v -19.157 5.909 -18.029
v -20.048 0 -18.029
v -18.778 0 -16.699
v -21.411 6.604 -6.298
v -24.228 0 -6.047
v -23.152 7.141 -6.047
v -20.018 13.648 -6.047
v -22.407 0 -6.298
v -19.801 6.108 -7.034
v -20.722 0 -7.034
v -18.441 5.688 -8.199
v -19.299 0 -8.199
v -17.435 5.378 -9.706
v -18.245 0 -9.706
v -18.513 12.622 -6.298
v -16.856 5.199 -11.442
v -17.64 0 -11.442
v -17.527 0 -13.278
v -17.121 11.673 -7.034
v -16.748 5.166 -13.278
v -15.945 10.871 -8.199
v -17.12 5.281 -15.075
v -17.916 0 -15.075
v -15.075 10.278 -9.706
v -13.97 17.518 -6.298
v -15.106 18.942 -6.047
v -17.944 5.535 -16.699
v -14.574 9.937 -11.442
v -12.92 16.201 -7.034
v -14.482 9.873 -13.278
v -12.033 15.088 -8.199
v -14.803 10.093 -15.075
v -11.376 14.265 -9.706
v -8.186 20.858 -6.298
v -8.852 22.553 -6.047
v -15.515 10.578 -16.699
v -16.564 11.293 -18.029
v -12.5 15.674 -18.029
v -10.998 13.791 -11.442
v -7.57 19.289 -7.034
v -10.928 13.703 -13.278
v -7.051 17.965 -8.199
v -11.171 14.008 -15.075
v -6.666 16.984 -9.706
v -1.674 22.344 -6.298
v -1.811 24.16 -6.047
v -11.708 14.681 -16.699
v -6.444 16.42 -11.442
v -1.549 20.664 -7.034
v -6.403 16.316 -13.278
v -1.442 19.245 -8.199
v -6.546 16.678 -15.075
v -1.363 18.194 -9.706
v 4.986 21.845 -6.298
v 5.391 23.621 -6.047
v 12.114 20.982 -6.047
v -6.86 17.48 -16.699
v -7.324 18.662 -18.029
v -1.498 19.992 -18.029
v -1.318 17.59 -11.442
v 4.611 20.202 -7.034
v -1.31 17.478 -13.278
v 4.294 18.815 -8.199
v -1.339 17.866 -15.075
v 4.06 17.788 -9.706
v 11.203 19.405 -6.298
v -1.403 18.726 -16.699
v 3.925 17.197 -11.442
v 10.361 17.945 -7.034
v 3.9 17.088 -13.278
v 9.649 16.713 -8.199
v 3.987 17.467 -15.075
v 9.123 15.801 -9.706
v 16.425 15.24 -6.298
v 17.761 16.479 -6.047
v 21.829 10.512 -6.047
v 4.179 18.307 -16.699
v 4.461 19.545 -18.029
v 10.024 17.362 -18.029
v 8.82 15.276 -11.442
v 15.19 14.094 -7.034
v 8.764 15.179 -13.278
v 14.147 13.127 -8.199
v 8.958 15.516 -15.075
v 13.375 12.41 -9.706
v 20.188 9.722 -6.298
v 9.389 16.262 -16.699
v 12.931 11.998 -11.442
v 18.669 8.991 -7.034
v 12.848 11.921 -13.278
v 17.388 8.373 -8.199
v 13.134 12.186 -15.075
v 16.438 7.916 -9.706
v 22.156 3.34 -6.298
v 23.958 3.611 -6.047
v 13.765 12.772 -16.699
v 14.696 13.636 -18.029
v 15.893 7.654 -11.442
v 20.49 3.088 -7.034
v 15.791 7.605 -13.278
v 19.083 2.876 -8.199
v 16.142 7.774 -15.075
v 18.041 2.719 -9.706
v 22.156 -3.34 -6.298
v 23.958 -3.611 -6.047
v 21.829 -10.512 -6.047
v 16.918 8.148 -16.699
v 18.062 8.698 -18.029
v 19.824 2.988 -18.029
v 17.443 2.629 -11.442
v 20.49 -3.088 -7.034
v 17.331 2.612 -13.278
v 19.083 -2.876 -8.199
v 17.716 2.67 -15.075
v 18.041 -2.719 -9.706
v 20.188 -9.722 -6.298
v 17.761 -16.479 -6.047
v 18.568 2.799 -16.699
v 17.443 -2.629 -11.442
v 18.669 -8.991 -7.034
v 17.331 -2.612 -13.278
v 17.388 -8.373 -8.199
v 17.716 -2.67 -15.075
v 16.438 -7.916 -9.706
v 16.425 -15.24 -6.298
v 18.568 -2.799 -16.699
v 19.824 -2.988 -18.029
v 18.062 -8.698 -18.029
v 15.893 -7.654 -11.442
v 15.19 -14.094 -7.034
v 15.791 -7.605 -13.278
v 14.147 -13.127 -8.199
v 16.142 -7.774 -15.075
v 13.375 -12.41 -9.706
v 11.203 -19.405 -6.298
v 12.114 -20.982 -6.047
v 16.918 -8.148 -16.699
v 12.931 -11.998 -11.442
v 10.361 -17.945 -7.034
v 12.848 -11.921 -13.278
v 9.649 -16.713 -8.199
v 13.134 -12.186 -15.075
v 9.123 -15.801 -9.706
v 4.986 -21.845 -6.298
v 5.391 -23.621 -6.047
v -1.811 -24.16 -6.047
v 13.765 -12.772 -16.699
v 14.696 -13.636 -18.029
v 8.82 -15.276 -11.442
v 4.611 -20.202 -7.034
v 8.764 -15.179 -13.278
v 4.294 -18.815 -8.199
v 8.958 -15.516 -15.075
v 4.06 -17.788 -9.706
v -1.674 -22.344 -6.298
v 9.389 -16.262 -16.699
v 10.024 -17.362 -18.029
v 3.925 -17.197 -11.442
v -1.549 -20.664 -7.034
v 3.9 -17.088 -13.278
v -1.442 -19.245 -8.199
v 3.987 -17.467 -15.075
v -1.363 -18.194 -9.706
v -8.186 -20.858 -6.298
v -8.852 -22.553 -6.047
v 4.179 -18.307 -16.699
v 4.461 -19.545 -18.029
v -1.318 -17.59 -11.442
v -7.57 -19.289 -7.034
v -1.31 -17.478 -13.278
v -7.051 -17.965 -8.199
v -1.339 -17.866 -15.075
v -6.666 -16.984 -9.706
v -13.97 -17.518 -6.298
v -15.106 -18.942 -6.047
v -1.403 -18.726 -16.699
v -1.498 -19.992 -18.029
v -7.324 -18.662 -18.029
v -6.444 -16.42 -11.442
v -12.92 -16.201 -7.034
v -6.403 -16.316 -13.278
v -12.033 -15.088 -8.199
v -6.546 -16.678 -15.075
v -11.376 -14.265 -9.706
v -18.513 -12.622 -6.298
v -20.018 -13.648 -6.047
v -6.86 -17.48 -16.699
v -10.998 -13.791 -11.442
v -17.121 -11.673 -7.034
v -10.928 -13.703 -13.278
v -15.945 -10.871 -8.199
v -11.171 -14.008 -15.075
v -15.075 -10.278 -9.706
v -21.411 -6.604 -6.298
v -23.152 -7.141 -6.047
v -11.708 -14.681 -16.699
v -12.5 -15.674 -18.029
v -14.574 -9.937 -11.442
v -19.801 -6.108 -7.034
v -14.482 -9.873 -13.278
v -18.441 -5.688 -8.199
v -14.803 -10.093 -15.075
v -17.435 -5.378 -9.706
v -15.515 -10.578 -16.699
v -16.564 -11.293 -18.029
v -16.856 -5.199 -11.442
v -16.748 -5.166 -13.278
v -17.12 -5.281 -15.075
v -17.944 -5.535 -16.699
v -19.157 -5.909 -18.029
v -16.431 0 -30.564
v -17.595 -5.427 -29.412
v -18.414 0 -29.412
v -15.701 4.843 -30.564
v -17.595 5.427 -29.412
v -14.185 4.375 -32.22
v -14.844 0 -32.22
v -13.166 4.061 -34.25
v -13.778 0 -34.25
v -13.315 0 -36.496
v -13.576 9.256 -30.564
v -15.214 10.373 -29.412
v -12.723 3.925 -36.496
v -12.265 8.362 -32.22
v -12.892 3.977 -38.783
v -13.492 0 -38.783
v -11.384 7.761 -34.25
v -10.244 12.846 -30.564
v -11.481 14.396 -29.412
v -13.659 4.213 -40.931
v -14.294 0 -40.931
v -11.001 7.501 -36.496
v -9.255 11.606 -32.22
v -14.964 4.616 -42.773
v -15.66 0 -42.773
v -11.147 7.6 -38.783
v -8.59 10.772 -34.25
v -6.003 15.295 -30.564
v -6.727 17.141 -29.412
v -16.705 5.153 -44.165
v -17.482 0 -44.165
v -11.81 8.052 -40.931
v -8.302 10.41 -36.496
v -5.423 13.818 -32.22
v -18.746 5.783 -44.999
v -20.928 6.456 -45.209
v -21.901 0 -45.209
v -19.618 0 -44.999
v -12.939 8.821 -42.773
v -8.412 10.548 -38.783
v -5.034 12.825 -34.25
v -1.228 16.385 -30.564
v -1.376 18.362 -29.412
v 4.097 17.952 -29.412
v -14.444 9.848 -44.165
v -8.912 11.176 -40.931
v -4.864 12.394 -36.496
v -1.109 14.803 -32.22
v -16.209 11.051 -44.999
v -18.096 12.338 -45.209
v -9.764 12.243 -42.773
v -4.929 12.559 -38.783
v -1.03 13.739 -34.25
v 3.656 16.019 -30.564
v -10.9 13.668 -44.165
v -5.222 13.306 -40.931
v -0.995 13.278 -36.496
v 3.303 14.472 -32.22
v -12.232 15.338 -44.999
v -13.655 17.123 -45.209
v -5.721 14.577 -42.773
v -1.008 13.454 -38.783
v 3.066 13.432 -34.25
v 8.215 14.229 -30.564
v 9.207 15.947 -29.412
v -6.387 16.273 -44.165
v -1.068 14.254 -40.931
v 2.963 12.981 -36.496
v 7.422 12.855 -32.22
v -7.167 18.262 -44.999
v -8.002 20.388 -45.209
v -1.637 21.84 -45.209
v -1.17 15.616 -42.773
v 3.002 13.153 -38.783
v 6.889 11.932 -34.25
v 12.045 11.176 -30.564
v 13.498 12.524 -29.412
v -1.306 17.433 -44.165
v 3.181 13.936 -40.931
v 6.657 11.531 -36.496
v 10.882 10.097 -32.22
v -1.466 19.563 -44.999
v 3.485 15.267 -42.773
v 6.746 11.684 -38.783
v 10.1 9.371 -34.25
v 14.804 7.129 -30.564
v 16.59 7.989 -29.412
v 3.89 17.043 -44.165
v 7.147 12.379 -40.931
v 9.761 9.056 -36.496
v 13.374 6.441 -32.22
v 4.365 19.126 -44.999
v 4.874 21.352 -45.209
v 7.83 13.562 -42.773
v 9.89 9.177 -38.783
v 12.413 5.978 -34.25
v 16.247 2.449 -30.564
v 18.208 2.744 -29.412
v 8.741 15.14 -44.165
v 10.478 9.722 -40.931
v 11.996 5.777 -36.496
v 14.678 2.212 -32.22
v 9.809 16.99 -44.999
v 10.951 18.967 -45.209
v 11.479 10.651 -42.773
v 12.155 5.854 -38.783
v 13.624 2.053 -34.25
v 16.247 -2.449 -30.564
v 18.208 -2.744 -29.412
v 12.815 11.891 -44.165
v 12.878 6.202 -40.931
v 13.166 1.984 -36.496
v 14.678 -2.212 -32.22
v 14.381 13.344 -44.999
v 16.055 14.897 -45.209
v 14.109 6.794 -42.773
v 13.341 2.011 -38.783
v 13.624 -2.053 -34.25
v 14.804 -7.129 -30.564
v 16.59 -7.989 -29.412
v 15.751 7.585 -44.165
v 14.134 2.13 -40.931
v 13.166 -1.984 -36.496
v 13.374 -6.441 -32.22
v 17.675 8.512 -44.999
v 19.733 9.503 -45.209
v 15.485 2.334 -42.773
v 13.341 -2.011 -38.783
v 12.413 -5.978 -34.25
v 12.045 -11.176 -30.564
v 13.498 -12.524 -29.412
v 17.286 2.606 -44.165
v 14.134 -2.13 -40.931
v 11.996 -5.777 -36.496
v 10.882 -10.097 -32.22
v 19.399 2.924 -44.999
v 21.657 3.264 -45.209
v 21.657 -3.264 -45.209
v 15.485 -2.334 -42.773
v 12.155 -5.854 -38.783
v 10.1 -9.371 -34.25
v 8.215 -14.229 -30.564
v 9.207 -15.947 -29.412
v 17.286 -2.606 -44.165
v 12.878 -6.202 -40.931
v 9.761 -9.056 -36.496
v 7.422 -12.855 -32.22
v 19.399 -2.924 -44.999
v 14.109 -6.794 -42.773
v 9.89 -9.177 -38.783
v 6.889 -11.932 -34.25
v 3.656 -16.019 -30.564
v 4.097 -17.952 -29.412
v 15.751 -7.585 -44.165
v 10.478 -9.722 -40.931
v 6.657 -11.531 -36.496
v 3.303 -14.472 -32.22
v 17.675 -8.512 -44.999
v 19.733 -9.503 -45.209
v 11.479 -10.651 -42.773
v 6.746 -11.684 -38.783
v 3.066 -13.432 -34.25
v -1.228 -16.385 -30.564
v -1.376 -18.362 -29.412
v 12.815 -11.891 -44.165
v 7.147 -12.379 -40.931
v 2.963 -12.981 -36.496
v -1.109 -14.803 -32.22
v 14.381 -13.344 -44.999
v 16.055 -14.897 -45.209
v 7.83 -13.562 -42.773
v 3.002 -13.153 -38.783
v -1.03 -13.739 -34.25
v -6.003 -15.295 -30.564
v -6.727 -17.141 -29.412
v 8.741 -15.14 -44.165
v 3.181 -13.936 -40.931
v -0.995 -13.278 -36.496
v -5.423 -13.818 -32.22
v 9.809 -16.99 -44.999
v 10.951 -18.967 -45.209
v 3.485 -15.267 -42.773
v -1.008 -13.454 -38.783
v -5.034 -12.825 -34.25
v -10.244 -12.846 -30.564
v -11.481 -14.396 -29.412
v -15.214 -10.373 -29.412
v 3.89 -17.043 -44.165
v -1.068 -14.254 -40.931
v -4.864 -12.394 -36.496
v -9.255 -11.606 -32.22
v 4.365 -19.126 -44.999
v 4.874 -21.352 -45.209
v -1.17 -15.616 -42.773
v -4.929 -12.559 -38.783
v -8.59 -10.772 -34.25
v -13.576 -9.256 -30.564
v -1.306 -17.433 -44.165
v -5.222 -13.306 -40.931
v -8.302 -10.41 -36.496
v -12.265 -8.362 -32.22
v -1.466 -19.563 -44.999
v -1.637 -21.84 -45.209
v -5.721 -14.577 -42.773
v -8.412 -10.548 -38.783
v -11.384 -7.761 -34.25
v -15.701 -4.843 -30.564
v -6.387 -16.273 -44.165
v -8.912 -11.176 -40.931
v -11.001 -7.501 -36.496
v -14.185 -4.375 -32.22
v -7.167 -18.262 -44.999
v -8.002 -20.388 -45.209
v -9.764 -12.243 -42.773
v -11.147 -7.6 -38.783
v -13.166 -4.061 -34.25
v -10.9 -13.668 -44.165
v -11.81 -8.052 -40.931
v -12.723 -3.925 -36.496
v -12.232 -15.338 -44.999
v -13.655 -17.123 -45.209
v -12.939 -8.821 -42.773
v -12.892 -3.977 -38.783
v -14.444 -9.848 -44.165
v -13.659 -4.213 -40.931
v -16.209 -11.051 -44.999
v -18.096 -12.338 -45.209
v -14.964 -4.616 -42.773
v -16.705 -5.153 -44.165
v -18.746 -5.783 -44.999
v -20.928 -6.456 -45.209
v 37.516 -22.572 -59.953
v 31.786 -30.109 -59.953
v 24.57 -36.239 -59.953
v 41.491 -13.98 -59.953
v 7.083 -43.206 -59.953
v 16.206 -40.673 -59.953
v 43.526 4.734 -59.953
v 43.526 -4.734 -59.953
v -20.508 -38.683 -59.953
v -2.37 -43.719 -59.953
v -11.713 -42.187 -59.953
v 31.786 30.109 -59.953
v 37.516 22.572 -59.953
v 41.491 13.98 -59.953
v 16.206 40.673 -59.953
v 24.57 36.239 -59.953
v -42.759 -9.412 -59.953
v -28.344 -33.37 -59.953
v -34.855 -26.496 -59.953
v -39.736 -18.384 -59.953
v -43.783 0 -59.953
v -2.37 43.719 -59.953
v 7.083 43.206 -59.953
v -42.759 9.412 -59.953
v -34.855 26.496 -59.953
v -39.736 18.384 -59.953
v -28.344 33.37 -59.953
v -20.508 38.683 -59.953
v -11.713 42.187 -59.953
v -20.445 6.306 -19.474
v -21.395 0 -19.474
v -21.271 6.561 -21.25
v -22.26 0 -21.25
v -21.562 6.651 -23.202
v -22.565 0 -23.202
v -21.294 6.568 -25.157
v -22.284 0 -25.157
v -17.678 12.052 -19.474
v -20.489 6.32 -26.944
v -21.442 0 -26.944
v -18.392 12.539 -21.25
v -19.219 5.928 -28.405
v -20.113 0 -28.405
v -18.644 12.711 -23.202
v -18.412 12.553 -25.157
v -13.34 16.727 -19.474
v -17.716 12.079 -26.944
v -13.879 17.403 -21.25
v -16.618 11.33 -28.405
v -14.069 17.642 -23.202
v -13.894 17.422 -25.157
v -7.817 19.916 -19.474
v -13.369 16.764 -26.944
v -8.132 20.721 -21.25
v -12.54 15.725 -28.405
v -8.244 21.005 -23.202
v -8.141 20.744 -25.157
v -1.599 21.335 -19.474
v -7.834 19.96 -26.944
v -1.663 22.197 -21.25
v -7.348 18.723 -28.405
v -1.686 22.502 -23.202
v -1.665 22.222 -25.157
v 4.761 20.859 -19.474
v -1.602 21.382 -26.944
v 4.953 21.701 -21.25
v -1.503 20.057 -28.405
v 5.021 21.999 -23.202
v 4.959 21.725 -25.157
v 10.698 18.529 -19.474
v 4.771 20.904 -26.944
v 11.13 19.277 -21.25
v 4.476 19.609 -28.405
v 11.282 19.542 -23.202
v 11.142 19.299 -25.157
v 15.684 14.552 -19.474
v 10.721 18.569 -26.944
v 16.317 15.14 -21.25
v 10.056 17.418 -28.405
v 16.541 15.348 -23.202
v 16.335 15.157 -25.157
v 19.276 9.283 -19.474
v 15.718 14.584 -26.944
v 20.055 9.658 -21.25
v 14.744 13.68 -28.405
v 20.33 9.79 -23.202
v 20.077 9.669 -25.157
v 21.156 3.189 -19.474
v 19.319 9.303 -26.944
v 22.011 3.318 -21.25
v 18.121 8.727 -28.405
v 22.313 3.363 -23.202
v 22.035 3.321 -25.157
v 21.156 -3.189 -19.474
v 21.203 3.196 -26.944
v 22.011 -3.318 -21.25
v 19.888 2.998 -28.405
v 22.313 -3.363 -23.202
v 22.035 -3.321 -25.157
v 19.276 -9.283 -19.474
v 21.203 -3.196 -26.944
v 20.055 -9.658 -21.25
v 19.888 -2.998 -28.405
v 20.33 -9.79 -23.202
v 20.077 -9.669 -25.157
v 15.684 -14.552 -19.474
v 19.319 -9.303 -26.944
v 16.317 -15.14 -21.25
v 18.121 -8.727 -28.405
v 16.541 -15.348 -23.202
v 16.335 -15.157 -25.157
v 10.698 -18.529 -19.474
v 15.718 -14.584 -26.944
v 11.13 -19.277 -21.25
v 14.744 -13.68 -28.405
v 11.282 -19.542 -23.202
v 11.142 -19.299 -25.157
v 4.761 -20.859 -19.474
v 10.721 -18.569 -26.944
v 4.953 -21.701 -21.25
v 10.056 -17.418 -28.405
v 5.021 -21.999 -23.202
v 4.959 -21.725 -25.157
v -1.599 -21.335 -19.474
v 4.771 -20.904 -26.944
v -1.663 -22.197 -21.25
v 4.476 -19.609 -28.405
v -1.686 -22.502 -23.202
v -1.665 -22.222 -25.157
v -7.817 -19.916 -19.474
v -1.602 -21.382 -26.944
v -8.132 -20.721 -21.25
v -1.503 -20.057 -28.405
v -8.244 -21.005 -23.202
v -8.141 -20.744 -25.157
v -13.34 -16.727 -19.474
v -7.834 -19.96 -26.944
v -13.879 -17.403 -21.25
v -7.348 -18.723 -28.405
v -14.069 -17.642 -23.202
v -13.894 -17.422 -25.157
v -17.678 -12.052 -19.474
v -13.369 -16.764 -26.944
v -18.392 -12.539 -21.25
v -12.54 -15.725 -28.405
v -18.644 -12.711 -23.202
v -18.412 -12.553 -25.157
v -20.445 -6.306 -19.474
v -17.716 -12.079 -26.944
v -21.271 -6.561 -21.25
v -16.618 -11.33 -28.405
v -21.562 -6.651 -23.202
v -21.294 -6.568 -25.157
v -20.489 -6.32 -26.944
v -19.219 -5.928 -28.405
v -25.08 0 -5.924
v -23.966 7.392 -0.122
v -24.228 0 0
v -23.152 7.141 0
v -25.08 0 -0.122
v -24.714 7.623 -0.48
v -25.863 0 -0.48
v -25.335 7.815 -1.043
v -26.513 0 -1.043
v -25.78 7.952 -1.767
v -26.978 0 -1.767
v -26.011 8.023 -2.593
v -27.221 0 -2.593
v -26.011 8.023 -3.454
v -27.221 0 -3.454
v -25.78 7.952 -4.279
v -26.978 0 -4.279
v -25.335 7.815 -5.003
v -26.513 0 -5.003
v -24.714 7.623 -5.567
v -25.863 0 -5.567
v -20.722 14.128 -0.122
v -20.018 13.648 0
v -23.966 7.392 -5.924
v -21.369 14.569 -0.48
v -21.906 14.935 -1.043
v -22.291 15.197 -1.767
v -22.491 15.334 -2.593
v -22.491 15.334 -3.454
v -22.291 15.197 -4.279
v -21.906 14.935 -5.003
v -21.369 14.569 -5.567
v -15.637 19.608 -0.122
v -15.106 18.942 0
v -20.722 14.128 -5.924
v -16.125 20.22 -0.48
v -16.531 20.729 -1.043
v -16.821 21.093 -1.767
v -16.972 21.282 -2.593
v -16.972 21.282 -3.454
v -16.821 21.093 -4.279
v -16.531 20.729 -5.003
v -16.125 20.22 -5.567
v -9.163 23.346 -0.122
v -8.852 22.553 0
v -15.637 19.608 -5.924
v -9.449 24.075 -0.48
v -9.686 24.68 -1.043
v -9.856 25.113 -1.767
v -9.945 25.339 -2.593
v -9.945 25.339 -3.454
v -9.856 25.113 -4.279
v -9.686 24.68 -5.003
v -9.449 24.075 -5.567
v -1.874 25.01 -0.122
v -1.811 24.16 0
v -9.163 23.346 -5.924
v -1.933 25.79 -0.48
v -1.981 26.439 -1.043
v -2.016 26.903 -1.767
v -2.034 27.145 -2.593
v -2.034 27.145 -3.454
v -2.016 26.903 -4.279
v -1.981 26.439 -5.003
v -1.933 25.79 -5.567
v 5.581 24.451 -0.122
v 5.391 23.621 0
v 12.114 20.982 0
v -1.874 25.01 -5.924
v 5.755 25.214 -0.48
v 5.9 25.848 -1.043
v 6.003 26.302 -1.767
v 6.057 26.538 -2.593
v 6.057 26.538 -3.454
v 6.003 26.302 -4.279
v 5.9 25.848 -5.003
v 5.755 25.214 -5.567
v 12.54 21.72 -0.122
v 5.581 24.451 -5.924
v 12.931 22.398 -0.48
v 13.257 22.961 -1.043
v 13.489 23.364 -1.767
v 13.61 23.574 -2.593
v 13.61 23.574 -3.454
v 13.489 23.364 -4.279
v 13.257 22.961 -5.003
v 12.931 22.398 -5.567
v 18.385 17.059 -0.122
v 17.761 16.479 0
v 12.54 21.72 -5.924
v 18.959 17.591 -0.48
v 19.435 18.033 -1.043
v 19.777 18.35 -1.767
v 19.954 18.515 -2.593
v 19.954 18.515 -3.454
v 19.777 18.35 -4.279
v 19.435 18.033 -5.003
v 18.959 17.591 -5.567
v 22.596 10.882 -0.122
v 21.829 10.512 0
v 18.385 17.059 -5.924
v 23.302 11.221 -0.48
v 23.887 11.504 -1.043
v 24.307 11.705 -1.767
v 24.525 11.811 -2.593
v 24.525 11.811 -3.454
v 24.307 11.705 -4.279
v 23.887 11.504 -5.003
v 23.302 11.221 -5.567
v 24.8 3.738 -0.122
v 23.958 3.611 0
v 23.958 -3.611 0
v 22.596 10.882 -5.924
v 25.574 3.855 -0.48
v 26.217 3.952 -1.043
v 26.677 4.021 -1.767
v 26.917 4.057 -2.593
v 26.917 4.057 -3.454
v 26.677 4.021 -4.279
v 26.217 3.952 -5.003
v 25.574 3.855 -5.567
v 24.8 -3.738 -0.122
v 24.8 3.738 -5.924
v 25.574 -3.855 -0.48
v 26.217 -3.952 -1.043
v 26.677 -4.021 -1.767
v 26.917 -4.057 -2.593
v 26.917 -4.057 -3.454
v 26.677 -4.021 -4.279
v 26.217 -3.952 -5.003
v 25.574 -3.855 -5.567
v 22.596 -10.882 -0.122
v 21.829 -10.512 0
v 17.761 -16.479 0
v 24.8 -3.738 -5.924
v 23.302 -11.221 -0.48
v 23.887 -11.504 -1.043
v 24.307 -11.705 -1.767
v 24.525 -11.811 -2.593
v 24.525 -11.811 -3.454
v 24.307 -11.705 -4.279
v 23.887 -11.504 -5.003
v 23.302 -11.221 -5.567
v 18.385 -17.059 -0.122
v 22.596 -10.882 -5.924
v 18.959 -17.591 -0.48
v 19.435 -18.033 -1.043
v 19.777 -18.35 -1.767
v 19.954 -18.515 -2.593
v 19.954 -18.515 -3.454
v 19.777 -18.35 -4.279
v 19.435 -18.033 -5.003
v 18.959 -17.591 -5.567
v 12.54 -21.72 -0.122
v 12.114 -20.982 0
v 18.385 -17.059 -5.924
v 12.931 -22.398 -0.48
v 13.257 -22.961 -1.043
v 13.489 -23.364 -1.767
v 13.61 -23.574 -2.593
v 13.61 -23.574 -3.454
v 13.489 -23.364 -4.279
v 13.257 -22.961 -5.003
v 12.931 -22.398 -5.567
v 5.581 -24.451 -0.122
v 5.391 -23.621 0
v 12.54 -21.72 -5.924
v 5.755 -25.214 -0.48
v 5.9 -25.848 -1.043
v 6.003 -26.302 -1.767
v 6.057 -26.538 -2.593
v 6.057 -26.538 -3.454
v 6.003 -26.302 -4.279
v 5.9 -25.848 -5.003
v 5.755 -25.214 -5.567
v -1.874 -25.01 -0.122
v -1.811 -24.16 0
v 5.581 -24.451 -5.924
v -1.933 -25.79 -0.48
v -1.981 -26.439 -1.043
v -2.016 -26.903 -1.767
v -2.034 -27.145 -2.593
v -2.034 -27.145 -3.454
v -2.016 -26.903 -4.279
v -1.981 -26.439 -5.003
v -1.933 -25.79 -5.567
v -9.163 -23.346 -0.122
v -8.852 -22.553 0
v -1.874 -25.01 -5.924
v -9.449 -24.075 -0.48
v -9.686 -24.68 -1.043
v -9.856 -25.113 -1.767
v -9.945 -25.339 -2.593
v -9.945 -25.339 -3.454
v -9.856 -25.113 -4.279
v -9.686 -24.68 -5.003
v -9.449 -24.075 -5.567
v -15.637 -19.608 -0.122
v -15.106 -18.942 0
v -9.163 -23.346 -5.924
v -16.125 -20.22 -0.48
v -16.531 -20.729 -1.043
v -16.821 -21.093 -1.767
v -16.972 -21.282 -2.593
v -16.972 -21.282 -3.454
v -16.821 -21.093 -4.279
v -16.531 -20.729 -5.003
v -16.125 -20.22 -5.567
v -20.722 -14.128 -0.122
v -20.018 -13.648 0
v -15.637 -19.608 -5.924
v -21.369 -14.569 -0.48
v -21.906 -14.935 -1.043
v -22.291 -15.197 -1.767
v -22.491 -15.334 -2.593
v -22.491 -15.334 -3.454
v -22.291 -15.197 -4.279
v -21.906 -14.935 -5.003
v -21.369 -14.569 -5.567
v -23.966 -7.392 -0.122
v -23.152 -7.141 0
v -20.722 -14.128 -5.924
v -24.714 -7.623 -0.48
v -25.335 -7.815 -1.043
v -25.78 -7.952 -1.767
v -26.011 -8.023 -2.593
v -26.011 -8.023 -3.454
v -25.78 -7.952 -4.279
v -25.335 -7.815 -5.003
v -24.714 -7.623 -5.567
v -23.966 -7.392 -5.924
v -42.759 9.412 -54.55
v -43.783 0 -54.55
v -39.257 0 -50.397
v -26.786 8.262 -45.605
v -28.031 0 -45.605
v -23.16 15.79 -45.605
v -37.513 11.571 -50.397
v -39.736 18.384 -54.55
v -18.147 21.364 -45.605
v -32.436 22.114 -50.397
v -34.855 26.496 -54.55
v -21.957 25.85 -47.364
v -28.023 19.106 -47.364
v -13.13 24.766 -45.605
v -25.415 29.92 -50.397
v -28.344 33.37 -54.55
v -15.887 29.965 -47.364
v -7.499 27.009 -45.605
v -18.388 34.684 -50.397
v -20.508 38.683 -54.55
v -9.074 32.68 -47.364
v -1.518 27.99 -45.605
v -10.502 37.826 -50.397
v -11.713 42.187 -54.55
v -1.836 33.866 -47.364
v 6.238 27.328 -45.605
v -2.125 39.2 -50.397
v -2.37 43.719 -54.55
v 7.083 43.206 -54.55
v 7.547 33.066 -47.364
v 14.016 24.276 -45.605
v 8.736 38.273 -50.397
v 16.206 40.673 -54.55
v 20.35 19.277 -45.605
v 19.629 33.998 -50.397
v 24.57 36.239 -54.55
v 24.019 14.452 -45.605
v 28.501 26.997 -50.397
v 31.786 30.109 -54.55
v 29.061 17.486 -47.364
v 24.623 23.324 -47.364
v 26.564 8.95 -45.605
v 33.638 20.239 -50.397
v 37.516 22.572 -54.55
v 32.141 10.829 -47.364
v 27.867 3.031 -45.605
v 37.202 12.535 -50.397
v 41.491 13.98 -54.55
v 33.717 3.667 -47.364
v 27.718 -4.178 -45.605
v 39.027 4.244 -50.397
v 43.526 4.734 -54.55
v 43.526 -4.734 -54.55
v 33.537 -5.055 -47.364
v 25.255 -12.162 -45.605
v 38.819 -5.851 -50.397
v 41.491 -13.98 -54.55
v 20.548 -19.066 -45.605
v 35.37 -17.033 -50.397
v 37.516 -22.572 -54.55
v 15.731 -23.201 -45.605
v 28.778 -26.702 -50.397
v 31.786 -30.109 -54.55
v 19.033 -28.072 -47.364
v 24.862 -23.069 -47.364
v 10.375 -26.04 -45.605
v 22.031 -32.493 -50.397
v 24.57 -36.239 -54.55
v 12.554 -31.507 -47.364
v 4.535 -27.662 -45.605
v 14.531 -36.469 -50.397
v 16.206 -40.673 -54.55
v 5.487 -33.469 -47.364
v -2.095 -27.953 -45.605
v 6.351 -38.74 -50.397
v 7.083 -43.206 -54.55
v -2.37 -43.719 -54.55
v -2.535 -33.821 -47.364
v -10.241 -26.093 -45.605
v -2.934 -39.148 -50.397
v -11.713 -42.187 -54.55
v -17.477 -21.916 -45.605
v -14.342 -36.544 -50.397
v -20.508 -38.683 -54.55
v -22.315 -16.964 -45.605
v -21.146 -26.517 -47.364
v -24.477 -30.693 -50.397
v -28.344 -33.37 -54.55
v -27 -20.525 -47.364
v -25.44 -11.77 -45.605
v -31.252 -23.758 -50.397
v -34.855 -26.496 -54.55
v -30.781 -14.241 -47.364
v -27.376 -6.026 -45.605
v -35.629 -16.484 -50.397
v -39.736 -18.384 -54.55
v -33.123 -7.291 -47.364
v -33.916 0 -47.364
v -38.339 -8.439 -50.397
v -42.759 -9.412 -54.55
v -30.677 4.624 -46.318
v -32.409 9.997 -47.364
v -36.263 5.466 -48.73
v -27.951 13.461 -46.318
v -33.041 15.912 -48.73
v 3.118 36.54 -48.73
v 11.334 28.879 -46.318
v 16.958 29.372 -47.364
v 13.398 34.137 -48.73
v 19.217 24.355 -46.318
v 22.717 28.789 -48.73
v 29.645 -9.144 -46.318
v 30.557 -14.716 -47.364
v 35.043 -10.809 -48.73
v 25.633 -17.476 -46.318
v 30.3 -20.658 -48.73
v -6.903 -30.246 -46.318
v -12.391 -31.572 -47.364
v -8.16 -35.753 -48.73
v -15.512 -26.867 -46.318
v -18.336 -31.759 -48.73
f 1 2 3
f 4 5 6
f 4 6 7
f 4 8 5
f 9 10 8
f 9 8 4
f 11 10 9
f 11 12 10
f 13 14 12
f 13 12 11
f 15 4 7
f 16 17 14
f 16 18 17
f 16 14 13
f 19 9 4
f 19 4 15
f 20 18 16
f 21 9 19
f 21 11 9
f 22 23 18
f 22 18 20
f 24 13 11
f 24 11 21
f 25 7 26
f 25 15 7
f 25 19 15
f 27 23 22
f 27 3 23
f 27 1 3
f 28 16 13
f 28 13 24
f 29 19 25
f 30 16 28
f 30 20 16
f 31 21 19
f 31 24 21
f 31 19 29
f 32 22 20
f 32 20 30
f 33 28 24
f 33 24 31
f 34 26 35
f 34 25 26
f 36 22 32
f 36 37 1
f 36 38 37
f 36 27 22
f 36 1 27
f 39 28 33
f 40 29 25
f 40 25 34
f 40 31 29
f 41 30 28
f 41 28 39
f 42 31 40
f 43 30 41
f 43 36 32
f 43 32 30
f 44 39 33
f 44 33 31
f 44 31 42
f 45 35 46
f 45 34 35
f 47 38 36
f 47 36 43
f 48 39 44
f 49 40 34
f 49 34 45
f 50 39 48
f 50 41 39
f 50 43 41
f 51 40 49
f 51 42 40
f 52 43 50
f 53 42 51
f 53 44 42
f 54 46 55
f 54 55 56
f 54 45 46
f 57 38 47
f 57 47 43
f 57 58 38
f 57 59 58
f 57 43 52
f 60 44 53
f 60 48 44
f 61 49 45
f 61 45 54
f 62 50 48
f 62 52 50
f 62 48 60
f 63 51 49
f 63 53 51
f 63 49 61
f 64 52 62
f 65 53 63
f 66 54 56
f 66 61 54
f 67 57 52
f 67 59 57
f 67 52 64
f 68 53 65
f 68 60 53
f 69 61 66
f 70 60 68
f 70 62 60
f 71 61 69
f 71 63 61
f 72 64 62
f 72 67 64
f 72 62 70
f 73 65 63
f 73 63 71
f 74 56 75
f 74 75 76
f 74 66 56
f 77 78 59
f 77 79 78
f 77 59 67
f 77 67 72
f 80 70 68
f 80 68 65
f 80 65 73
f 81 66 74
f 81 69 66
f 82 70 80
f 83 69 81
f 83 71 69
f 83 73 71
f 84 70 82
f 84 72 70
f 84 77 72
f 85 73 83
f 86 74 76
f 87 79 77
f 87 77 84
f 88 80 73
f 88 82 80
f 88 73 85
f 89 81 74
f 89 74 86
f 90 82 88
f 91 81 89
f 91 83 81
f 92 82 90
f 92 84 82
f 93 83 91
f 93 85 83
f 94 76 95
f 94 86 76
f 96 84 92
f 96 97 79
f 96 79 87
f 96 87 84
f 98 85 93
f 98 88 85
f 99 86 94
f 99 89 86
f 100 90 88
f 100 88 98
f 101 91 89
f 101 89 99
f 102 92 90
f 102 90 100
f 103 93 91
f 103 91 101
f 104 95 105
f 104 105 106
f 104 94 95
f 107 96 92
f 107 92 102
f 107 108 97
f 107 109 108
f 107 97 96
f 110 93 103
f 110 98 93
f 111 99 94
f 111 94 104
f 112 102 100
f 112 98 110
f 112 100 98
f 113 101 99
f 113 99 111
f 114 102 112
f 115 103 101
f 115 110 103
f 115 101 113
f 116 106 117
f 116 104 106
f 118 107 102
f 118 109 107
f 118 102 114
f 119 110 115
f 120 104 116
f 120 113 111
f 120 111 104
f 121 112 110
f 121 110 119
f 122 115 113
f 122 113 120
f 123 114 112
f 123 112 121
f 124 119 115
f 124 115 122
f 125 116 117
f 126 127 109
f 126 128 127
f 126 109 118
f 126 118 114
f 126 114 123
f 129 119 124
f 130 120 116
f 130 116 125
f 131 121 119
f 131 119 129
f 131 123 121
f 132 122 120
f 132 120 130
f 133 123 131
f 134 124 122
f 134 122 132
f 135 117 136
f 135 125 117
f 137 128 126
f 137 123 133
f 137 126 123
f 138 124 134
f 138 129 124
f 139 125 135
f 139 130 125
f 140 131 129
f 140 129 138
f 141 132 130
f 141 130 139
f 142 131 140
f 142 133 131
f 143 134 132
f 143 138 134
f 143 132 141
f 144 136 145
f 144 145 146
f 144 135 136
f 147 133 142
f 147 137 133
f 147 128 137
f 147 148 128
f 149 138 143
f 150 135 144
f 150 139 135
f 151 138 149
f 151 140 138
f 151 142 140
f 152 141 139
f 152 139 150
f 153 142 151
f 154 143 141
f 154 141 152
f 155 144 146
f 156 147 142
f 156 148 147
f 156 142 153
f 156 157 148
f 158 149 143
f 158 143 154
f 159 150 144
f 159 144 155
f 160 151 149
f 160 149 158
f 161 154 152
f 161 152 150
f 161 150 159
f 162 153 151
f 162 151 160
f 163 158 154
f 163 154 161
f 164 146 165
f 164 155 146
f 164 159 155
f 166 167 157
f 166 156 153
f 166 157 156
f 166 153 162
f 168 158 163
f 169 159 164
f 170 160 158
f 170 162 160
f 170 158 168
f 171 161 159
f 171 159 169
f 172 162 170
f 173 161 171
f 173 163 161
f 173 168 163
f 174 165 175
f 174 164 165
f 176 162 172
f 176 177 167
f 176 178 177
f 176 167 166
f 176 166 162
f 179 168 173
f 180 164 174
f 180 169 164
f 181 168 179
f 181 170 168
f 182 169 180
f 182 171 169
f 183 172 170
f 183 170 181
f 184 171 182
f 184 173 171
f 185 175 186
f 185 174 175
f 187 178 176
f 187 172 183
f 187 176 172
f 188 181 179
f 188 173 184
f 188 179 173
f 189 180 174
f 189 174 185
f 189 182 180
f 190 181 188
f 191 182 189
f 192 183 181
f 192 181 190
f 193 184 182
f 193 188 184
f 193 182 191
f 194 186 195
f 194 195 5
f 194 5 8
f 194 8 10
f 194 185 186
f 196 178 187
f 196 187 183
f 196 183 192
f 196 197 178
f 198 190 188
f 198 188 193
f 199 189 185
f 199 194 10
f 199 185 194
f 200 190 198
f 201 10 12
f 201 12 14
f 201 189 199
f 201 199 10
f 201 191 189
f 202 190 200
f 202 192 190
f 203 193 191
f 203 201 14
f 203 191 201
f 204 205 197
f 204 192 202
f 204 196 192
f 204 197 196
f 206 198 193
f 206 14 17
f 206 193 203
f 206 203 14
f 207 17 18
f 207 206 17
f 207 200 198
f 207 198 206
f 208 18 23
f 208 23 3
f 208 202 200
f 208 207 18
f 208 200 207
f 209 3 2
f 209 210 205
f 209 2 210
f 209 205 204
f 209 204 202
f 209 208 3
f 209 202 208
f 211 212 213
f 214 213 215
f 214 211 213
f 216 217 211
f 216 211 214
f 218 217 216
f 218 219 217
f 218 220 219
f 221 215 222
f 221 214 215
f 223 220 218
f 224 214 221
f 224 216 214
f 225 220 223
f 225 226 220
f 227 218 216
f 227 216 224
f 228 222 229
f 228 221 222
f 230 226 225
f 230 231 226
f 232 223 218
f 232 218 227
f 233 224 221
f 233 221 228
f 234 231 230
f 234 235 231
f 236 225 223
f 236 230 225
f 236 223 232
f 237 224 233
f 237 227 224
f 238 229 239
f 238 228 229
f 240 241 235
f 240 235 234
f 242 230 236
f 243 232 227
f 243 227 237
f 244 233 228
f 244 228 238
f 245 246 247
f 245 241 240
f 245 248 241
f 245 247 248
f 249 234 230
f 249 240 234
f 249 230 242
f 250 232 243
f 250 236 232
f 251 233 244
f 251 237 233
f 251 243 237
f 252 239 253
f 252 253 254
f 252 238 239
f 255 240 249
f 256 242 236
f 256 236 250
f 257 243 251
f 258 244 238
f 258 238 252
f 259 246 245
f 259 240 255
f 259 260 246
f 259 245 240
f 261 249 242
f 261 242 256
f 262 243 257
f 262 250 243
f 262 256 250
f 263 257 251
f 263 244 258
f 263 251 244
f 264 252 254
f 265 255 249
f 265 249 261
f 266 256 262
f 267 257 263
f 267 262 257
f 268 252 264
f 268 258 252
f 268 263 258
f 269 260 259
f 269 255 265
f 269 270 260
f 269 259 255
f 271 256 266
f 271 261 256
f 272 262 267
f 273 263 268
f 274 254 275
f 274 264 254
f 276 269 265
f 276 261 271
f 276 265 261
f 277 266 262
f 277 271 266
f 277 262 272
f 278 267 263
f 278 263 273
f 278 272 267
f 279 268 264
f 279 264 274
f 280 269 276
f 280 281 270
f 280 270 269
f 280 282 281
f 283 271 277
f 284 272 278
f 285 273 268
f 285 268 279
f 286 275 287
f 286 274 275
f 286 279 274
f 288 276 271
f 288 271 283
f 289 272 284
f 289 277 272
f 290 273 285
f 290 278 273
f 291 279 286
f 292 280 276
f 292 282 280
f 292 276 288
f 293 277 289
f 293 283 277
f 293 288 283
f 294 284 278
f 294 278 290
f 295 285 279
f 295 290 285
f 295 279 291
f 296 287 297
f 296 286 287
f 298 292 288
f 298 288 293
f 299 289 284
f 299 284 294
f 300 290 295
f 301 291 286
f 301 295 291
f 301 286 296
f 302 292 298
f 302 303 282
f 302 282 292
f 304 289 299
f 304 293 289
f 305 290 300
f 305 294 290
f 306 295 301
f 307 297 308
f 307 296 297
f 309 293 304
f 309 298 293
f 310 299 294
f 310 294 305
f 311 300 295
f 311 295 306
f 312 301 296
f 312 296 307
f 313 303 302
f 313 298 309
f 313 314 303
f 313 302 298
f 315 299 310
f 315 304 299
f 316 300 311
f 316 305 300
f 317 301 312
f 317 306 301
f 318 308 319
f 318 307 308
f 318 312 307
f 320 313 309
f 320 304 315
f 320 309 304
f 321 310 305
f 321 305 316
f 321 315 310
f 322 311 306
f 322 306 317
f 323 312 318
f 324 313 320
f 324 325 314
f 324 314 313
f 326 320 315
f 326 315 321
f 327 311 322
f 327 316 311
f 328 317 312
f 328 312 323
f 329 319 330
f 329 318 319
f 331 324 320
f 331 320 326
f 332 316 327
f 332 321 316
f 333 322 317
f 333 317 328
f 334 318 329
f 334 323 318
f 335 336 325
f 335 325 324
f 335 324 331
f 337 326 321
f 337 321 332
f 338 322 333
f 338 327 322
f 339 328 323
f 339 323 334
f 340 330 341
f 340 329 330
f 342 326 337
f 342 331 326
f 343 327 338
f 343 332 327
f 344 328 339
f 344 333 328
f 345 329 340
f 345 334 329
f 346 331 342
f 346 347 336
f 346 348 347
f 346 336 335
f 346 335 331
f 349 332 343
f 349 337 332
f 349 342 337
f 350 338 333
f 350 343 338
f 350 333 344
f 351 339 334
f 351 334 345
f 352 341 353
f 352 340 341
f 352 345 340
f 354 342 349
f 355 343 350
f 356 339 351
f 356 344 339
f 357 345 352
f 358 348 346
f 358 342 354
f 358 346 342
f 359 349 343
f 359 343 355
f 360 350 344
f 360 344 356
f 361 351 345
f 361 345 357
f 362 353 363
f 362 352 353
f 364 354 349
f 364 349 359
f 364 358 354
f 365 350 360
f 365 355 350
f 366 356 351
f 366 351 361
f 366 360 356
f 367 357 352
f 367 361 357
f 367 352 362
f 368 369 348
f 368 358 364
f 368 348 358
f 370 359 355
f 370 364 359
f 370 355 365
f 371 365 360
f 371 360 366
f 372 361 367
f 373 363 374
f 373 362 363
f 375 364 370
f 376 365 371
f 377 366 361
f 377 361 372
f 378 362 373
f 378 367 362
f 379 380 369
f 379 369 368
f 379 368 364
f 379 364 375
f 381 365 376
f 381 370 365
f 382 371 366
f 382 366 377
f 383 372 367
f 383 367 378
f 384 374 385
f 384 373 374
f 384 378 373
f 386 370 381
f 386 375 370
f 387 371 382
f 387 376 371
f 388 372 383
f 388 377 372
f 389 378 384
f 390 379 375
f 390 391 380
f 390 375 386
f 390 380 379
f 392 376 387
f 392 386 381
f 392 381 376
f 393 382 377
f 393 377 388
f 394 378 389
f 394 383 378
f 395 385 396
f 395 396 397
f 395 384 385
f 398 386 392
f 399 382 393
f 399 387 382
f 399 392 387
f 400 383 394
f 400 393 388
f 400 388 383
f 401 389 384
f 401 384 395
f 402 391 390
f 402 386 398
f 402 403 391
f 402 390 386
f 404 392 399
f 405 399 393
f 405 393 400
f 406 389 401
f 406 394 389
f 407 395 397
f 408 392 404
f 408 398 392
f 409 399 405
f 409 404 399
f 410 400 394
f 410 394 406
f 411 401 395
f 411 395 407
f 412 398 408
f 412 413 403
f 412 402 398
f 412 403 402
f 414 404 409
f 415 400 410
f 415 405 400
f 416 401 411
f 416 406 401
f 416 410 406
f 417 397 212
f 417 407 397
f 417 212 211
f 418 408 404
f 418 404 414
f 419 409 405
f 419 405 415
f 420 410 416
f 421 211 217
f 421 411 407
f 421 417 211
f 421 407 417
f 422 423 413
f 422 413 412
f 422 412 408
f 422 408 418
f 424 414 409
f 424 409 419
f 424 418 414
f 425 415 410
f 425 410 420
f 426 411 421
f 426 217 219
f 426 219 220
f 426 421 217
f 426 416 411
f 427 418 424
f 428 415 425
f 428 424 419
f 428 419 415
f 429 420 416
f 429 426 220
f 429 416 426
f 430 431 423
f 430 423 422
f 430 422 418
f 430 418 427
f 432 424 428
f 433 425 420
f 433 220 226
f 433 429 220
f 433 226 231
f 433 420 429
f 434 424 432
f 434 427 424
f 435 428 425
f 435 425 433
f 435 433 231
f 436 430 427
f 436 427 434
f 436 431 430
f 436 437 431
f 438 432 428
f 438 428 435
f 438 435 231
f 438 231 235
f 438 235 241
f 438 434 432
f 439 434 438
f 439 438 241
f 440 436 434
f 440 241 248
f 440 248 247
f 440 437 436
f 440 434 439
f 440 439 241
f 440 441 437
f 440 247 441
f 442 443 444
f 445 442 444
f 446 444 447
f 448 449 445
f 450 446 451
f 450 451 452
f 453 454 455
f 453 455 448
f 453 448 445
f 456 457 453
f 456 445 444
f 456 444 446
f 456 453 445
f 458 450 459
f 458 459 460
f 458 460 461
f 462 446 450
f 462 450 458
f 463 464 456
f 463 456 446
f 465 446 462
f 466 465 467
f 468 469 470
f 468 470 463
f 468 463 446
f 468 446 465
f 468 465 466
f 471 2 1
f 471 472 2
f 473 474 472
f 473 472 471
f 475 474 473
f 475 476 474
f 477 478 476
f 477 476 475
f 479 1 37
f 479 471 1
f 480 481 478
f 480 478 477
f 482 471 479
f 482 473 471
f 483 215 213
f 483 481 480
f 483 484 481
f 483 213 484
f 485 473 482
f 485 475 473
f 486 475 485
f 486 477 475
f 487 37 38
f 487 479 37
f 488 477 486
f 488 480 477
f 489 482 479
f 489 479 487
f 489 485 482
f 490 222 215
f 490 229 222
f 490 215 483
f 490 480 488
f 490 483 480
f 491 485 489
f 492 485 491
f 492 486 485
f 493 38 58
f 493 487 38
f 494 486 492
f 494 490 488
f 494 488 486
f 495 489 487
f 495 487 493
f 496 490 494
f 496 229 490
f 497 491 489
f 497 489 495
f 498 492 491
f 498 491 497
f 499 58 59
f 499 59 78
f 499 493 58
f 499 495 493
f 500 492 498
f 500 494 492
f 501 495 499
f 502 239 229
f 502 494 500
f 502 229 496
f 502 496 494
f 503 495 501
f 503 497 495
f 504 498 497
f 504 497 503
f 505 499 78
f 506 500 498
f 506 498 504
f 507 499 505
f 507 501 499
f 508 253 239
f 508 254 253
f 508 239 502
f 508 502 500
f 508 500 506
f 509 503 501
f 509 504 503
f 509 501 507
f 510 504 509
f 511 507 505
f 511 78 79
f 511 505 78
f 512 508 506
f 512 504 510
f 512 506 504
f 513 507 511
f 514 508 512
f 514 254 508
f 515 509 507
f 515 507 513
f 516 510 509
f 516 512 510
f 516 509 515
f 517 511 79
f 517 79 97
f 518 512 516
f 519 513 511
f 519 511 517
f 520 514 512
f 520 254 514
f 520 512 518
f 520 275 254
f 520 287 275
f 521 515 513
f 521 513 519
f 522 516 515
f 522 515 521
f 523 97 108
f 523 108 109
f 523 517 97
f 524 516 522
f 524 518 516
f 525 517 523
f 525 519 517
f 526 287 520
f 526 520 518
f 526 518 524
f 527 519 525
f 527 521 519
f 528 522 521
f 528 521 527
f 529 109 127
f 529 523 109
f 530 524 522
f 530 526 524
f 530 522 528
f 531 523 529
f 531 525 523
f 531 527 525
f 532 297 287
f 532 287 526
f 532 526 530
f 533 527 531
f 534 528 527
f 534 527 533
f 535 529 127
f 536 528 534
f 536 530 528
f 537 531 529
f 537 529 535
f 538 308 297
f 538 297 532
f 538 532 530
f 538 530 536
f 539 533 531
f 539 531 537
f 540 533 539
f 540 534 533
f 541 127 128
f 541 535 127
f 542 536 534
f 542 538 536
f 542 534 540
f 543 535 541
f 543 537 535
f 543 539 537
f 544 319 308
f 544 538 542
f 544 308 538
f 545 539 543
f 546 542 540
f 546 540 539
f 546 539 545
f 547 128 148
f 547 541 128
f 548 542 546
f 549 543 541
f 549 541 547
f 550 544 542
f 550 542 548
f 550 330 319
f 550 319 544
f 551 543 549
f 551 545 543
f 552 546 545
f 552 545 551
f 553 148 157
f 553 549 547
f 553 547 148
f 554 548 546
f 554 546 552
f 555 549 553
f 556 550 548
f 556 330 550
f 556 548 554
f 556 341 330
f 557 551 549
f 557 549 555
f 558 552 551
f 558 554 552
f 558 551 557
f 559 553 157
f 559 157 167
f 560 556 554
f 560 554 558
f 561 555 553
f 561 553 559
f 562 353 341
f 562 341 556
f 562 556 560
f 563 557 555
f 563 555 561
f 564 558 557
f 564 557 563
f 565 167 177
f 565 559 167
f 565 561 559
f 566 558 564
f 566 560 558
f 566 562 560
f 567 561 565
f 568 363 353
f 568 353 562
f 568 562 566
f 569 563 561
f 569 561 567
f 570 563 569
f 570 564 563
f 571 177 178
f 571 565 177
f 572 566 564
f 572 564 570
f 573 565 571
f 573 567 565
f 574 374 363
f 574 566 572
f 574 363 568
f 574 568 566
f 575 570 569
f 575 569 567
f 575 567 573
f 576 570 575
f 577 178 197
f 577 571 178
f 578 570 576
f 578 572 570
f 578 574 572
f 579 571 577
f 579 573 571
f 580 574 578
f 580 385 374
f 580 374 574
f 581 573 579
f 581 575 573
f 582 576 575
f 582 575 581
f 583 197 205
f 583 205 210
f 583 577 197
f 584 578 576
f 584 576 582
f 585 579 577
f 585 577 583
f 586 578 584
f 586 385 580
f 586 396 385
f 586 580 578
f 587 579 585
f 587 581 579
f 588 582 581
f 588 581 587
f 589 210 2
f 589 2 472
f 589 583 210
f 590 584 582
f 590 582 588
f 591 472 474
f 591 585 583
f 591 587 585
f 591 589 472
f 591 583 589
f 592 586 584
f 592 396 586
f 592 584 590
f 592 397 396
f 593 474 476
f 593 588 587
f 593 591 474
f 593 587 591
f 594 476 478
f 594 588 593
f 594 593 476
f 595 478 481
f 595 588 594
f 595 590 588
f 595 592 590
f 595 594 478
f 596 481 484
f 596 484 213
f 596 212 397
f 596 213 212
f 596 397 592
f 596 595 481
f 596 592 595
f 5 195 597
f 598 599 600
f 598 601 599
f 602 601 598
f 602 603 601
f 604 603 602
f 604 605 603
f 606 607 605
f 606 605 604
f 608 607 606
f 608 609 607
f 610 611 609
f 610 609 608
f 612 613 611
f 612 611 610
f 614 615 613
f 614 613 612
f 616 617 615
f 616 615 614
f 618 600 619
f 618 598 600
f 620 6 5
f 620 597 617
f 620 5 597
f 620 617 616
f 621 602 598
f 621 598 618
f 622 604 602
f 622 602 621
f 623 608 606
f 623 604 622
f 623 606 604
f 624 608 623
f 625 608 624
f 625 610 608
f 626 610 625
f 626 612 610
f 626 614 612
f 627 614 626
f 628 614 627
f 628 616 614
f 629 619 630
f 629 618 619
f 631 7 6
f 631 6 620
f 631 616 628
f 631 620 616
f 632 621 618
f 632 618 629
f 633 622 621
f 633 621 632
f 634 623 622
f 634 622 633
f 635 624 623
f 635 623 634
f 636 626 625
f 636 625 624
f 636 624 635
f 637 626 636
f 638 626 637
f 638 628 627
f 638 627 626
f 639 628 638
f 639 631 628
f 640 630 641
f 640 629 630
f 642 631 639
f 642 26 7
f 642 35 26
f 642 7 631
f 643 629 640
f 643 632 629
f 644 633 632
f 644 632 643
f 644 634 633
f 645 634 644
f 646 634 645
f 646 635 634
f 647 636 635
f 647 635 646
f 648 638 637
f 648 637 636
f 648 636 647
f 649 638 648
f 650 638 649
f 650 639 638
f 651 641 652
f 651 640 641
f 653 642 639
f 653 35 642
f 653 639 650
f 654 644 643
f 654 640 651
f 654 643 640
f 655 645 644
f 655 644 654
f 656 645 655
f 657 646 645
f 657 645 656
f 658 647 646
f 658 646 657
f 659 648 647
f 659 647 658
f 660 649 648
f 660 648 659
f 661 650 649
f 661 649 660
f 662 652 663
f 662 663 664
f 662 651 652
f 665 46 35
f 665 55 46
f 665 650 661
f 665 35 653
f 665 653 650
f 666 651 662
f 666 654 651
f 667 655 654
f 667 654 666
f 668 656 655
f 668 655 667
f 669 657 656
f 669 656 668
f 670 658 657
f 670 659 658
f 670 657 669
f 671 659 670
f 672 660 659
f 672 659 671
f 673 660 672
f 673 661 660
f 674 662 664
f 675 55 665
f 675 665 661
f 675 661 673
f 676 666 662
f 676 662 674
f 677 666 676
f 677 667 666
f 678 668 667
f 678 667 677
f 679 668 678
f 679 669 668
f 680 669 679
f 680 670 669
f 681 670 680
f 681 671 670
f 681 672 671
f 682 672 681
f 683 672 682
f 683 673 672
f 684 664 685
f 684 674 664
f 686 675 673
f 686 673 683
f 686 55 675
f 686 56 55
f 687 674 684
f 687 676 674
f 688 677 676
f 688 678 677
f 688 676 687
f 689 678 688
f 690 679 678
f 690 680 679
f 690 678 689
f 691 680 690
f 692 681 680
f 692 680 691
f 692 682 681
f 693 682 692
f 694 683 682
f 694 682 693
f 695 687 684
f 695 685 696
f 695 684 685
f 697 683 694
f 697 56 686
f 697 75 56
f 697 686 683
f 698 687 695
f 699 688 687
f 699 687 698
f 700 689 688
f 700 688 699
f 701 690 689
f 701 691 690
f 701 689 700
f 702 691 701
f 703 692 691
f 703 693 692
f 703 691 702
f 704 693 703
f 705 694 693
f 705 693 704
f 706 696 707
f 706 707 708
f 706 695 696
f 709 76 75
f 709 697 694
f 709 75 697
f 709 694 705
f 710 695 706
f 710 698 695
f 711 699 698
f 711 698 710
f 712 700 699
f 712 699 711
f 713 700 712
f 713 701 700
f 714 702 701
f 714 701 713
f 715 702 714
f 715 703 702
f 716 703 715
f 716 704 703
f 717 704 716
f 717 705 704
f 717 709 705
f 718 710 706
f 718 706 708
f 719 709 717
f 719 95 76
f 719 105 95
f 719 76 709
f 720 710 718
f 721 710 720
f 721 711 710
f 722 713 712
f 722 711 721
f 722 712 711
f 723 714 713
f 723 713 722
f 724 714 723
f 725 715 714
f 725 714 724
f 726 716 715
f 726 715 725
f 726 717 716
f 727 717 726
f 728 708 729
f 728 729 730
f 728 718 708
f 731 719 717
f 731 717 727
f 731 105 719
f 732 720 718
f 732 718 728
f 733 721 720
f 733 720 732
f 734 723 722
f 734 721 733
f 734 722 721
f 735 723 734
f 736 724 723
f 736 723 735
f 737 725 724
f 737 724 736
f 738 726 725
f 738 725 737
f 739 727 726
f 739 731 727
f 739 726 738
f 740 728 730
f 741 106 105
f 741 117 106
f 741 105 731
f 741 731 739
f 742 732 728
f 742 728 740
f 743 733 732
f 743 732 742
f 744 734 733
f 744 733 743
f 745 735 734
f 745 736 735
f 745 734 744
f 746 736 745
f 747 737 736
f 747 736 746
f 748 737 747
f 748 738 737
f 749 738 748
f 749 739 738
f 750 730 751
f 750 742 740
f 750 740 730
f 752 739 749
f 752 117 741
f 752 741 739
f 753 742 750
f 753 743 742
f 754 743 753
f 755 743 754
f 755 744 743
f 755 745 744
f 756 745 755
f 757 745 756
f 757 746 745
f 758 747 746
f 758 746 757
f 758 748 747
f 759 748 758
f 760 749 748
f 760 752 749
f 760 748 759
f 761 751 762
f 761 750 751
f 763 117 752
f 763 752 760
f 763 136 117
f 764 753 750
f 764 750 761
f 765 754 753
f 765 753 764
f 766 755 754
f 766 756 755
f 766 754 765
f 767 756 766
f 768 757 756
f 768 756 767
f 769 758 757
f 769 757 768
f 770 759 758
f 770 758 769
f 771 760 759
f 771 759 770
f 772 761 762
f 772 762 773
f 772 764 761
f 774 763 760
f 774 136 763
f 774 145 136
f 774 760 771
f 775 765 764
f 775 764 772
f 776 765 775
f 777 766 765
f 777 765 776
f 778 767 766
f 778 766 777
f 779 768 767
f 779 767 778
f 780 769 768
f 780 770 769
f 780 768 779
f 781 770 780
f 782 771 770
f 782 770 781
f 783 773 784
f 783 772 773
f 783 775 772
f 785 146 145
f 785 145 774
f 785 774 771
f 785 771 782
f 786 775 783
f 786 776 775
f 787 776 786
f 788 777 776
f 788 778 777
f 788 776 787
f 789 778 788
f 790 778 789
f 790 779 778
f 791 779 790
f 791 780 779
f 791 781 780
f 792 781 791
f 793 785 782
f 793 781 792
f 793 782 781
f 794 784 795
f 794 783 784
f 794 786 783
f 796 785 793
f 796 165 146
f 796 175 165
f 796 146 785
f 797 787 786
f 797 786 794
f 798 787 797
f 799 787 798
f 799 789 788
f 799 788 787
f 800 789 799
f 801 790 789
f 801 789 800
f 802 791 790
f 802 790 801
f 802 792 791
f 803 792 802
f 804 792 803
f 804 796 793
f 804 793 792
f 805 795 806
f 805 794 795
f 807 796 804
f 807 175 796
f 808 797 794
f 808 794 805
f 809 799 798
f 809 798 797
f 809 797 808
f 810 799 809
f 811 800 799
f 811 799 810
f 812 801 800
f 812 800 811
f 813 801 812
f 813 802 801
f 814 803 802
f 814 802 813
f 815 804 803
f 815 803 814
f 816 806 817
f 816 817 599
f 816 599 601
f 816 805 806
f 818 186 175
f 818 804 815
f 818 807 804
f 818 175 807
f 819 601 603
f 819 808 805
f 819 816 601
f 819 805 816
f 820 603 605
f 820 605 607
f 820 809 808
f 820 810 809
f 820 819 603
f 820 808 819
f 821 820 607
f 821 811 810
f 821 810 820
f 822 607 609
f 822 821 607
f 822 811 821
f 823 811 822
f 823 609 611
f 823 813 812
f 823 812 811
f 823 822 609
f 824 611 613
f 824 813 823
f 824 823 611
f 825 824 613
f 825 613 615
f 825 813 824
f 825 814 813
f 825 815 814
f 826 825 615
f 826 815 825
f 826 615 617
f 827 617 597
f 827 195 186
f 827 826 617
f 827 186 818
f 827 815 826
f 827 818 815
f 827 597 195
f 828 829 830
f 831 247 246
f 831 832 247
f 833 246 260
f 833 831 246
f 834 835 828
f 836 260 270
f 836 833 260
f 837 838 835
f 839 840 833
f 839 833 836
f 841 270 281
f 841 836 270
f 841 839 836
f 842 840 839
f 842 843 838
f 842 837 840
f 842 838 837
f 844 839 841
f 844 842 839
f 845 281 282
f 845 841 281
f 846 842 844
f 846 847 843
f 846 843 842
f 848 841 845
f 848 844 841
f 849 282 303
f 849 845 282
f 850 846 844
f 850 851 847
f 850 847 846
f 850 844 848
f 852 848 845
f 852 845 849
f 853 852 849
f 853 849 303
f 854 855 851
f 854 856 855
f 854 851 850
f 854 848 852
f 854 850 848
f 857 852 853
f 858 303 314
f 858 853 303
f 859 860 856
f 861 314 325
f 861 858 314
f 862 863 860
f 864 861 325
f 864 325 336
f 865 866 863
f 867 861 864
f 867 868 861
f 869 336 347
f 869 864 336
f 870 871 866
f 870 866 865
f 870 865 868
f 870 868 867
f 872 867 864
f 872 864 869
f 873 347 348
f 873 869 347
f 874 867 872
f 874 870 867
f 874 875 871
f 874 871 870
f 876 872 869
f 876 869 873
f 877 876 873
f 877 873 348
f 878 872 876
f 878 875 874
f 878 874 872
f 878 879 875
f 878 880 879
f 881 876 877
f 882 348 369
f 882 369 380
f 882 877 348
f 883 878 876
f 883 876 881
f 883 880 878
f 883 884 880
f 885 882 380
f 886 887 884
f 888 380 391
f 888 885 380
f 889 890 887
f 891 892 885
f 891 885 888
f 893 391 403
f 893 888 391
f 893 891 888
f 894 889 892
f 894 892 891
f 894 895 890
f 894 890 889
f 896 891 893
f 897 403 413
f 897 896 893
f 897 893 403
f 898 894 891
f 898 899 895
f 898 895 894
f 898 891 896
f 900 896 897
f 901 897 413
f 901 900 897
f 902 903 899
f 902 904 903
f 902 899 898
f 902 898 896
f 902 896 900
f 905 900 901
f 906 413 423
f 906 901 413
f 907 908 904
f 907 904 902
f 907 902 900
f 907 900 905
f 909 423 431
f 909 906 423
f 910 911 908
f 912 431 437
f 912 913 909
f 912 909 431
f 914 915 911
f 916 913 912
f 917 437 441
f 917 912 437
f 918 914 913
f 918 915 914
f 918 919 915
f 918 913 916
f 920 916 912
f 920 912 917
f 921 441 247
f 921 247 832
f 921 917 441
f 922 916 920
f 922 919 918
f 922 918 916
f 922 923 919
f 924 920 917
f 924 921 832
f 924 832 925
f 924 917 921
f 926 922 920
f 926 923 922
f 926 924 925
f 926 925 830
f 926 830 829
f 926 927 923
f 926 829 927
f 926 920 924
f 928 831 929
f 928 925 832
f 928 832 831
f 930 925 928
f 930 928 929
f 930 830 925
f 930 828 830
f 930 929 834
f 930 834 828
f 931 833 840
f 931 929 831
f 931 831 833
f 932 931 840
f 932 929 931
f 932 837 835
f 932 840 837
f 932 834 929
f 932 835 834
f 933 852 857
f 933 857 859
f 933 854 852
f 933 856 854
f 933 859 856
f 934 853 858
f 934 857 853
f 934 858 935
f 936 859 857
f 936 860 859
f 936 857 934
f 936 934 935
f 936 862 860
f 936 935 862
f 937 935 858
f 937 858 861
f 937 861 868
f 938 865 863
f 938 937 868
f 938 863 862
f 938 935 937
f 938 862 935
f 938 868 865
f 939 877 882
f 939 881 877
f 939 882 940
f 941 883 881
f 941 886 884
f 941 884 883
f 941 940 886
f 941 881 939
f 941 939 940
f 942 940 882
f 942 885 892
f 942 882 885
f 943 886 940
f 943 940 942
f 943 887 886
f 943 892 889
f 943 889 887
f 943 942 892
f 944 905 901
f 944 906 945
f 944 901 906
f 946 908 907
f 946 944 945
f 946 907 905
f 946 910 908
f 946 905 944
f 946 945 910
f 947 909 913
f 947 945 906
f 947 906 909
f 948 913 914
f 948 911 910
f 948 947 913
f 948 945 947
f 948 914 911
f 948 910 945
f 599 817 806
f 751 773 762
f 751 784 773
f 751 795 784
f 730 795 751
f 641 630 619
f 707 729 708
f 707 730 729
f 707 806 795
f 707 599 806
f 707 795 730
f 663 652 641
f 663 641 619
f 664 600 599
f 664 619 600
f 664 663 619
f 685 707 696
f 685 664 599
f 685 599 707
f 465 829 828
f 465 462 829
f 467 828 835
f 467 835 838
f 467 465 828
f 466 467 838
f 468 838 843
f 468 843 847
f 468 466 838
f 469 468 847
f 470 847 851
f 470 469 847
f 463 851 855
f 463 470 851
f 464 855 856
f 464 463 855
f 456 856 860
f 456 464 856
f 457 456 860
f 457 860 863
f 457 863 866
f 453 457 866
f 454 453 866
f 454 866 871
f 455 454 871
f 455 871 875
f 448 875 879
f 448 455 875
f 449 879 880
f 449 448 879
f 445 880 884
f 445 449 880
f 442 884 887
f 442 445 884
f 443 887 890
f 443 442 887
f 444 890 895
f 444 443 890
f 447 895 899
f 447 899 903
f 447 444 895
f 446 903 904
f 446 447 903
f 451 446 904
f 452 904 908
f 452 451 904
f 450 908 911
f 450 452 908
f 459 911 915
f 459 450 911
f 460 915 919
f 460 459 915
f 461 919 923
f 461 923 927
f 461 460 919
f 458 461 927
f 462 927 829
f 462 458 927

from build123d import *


with BuildPart() as f1:
    # F0 (on Front) → F1 (revolve)
    with BuildSketch(Plane.XZ):
        with BuildLine():
            Line((0, 0), (-24.228189, 0))
            ThreePointArc((-24.228189, 0), (-27.251564, -3.023375), (-24.228189, -6.04675))
            ThreePointArc((-24.228189, -6.04675), (-17.882746, -10.553541), (-20.04785, -18.029377))
            ThreePointArc((-20.04785, -18.029377), (-22.497267, -24.189915), (-18.41354, -29.412468))
            ThreePointArc((-18.41354, -29.412468), (-13.491565, -38.782533), (-21.90149, -45.208815))
            ThreePointArc((-21.90149, -45.208815), (-33.916157, -47.36402), (-43.782905, -54.550424))
            Line((-43.782905, -54.550424), (-43.782905, -59.953451))
            Line((-43.782905, -59.953451), (0, -59.953451))
            Line((0, -59.953451), (0, 0))
        make_face()
    revolve(axis=Axis((0, 0, -29.976726), (0, 0, -1)))


solid = f1.part
